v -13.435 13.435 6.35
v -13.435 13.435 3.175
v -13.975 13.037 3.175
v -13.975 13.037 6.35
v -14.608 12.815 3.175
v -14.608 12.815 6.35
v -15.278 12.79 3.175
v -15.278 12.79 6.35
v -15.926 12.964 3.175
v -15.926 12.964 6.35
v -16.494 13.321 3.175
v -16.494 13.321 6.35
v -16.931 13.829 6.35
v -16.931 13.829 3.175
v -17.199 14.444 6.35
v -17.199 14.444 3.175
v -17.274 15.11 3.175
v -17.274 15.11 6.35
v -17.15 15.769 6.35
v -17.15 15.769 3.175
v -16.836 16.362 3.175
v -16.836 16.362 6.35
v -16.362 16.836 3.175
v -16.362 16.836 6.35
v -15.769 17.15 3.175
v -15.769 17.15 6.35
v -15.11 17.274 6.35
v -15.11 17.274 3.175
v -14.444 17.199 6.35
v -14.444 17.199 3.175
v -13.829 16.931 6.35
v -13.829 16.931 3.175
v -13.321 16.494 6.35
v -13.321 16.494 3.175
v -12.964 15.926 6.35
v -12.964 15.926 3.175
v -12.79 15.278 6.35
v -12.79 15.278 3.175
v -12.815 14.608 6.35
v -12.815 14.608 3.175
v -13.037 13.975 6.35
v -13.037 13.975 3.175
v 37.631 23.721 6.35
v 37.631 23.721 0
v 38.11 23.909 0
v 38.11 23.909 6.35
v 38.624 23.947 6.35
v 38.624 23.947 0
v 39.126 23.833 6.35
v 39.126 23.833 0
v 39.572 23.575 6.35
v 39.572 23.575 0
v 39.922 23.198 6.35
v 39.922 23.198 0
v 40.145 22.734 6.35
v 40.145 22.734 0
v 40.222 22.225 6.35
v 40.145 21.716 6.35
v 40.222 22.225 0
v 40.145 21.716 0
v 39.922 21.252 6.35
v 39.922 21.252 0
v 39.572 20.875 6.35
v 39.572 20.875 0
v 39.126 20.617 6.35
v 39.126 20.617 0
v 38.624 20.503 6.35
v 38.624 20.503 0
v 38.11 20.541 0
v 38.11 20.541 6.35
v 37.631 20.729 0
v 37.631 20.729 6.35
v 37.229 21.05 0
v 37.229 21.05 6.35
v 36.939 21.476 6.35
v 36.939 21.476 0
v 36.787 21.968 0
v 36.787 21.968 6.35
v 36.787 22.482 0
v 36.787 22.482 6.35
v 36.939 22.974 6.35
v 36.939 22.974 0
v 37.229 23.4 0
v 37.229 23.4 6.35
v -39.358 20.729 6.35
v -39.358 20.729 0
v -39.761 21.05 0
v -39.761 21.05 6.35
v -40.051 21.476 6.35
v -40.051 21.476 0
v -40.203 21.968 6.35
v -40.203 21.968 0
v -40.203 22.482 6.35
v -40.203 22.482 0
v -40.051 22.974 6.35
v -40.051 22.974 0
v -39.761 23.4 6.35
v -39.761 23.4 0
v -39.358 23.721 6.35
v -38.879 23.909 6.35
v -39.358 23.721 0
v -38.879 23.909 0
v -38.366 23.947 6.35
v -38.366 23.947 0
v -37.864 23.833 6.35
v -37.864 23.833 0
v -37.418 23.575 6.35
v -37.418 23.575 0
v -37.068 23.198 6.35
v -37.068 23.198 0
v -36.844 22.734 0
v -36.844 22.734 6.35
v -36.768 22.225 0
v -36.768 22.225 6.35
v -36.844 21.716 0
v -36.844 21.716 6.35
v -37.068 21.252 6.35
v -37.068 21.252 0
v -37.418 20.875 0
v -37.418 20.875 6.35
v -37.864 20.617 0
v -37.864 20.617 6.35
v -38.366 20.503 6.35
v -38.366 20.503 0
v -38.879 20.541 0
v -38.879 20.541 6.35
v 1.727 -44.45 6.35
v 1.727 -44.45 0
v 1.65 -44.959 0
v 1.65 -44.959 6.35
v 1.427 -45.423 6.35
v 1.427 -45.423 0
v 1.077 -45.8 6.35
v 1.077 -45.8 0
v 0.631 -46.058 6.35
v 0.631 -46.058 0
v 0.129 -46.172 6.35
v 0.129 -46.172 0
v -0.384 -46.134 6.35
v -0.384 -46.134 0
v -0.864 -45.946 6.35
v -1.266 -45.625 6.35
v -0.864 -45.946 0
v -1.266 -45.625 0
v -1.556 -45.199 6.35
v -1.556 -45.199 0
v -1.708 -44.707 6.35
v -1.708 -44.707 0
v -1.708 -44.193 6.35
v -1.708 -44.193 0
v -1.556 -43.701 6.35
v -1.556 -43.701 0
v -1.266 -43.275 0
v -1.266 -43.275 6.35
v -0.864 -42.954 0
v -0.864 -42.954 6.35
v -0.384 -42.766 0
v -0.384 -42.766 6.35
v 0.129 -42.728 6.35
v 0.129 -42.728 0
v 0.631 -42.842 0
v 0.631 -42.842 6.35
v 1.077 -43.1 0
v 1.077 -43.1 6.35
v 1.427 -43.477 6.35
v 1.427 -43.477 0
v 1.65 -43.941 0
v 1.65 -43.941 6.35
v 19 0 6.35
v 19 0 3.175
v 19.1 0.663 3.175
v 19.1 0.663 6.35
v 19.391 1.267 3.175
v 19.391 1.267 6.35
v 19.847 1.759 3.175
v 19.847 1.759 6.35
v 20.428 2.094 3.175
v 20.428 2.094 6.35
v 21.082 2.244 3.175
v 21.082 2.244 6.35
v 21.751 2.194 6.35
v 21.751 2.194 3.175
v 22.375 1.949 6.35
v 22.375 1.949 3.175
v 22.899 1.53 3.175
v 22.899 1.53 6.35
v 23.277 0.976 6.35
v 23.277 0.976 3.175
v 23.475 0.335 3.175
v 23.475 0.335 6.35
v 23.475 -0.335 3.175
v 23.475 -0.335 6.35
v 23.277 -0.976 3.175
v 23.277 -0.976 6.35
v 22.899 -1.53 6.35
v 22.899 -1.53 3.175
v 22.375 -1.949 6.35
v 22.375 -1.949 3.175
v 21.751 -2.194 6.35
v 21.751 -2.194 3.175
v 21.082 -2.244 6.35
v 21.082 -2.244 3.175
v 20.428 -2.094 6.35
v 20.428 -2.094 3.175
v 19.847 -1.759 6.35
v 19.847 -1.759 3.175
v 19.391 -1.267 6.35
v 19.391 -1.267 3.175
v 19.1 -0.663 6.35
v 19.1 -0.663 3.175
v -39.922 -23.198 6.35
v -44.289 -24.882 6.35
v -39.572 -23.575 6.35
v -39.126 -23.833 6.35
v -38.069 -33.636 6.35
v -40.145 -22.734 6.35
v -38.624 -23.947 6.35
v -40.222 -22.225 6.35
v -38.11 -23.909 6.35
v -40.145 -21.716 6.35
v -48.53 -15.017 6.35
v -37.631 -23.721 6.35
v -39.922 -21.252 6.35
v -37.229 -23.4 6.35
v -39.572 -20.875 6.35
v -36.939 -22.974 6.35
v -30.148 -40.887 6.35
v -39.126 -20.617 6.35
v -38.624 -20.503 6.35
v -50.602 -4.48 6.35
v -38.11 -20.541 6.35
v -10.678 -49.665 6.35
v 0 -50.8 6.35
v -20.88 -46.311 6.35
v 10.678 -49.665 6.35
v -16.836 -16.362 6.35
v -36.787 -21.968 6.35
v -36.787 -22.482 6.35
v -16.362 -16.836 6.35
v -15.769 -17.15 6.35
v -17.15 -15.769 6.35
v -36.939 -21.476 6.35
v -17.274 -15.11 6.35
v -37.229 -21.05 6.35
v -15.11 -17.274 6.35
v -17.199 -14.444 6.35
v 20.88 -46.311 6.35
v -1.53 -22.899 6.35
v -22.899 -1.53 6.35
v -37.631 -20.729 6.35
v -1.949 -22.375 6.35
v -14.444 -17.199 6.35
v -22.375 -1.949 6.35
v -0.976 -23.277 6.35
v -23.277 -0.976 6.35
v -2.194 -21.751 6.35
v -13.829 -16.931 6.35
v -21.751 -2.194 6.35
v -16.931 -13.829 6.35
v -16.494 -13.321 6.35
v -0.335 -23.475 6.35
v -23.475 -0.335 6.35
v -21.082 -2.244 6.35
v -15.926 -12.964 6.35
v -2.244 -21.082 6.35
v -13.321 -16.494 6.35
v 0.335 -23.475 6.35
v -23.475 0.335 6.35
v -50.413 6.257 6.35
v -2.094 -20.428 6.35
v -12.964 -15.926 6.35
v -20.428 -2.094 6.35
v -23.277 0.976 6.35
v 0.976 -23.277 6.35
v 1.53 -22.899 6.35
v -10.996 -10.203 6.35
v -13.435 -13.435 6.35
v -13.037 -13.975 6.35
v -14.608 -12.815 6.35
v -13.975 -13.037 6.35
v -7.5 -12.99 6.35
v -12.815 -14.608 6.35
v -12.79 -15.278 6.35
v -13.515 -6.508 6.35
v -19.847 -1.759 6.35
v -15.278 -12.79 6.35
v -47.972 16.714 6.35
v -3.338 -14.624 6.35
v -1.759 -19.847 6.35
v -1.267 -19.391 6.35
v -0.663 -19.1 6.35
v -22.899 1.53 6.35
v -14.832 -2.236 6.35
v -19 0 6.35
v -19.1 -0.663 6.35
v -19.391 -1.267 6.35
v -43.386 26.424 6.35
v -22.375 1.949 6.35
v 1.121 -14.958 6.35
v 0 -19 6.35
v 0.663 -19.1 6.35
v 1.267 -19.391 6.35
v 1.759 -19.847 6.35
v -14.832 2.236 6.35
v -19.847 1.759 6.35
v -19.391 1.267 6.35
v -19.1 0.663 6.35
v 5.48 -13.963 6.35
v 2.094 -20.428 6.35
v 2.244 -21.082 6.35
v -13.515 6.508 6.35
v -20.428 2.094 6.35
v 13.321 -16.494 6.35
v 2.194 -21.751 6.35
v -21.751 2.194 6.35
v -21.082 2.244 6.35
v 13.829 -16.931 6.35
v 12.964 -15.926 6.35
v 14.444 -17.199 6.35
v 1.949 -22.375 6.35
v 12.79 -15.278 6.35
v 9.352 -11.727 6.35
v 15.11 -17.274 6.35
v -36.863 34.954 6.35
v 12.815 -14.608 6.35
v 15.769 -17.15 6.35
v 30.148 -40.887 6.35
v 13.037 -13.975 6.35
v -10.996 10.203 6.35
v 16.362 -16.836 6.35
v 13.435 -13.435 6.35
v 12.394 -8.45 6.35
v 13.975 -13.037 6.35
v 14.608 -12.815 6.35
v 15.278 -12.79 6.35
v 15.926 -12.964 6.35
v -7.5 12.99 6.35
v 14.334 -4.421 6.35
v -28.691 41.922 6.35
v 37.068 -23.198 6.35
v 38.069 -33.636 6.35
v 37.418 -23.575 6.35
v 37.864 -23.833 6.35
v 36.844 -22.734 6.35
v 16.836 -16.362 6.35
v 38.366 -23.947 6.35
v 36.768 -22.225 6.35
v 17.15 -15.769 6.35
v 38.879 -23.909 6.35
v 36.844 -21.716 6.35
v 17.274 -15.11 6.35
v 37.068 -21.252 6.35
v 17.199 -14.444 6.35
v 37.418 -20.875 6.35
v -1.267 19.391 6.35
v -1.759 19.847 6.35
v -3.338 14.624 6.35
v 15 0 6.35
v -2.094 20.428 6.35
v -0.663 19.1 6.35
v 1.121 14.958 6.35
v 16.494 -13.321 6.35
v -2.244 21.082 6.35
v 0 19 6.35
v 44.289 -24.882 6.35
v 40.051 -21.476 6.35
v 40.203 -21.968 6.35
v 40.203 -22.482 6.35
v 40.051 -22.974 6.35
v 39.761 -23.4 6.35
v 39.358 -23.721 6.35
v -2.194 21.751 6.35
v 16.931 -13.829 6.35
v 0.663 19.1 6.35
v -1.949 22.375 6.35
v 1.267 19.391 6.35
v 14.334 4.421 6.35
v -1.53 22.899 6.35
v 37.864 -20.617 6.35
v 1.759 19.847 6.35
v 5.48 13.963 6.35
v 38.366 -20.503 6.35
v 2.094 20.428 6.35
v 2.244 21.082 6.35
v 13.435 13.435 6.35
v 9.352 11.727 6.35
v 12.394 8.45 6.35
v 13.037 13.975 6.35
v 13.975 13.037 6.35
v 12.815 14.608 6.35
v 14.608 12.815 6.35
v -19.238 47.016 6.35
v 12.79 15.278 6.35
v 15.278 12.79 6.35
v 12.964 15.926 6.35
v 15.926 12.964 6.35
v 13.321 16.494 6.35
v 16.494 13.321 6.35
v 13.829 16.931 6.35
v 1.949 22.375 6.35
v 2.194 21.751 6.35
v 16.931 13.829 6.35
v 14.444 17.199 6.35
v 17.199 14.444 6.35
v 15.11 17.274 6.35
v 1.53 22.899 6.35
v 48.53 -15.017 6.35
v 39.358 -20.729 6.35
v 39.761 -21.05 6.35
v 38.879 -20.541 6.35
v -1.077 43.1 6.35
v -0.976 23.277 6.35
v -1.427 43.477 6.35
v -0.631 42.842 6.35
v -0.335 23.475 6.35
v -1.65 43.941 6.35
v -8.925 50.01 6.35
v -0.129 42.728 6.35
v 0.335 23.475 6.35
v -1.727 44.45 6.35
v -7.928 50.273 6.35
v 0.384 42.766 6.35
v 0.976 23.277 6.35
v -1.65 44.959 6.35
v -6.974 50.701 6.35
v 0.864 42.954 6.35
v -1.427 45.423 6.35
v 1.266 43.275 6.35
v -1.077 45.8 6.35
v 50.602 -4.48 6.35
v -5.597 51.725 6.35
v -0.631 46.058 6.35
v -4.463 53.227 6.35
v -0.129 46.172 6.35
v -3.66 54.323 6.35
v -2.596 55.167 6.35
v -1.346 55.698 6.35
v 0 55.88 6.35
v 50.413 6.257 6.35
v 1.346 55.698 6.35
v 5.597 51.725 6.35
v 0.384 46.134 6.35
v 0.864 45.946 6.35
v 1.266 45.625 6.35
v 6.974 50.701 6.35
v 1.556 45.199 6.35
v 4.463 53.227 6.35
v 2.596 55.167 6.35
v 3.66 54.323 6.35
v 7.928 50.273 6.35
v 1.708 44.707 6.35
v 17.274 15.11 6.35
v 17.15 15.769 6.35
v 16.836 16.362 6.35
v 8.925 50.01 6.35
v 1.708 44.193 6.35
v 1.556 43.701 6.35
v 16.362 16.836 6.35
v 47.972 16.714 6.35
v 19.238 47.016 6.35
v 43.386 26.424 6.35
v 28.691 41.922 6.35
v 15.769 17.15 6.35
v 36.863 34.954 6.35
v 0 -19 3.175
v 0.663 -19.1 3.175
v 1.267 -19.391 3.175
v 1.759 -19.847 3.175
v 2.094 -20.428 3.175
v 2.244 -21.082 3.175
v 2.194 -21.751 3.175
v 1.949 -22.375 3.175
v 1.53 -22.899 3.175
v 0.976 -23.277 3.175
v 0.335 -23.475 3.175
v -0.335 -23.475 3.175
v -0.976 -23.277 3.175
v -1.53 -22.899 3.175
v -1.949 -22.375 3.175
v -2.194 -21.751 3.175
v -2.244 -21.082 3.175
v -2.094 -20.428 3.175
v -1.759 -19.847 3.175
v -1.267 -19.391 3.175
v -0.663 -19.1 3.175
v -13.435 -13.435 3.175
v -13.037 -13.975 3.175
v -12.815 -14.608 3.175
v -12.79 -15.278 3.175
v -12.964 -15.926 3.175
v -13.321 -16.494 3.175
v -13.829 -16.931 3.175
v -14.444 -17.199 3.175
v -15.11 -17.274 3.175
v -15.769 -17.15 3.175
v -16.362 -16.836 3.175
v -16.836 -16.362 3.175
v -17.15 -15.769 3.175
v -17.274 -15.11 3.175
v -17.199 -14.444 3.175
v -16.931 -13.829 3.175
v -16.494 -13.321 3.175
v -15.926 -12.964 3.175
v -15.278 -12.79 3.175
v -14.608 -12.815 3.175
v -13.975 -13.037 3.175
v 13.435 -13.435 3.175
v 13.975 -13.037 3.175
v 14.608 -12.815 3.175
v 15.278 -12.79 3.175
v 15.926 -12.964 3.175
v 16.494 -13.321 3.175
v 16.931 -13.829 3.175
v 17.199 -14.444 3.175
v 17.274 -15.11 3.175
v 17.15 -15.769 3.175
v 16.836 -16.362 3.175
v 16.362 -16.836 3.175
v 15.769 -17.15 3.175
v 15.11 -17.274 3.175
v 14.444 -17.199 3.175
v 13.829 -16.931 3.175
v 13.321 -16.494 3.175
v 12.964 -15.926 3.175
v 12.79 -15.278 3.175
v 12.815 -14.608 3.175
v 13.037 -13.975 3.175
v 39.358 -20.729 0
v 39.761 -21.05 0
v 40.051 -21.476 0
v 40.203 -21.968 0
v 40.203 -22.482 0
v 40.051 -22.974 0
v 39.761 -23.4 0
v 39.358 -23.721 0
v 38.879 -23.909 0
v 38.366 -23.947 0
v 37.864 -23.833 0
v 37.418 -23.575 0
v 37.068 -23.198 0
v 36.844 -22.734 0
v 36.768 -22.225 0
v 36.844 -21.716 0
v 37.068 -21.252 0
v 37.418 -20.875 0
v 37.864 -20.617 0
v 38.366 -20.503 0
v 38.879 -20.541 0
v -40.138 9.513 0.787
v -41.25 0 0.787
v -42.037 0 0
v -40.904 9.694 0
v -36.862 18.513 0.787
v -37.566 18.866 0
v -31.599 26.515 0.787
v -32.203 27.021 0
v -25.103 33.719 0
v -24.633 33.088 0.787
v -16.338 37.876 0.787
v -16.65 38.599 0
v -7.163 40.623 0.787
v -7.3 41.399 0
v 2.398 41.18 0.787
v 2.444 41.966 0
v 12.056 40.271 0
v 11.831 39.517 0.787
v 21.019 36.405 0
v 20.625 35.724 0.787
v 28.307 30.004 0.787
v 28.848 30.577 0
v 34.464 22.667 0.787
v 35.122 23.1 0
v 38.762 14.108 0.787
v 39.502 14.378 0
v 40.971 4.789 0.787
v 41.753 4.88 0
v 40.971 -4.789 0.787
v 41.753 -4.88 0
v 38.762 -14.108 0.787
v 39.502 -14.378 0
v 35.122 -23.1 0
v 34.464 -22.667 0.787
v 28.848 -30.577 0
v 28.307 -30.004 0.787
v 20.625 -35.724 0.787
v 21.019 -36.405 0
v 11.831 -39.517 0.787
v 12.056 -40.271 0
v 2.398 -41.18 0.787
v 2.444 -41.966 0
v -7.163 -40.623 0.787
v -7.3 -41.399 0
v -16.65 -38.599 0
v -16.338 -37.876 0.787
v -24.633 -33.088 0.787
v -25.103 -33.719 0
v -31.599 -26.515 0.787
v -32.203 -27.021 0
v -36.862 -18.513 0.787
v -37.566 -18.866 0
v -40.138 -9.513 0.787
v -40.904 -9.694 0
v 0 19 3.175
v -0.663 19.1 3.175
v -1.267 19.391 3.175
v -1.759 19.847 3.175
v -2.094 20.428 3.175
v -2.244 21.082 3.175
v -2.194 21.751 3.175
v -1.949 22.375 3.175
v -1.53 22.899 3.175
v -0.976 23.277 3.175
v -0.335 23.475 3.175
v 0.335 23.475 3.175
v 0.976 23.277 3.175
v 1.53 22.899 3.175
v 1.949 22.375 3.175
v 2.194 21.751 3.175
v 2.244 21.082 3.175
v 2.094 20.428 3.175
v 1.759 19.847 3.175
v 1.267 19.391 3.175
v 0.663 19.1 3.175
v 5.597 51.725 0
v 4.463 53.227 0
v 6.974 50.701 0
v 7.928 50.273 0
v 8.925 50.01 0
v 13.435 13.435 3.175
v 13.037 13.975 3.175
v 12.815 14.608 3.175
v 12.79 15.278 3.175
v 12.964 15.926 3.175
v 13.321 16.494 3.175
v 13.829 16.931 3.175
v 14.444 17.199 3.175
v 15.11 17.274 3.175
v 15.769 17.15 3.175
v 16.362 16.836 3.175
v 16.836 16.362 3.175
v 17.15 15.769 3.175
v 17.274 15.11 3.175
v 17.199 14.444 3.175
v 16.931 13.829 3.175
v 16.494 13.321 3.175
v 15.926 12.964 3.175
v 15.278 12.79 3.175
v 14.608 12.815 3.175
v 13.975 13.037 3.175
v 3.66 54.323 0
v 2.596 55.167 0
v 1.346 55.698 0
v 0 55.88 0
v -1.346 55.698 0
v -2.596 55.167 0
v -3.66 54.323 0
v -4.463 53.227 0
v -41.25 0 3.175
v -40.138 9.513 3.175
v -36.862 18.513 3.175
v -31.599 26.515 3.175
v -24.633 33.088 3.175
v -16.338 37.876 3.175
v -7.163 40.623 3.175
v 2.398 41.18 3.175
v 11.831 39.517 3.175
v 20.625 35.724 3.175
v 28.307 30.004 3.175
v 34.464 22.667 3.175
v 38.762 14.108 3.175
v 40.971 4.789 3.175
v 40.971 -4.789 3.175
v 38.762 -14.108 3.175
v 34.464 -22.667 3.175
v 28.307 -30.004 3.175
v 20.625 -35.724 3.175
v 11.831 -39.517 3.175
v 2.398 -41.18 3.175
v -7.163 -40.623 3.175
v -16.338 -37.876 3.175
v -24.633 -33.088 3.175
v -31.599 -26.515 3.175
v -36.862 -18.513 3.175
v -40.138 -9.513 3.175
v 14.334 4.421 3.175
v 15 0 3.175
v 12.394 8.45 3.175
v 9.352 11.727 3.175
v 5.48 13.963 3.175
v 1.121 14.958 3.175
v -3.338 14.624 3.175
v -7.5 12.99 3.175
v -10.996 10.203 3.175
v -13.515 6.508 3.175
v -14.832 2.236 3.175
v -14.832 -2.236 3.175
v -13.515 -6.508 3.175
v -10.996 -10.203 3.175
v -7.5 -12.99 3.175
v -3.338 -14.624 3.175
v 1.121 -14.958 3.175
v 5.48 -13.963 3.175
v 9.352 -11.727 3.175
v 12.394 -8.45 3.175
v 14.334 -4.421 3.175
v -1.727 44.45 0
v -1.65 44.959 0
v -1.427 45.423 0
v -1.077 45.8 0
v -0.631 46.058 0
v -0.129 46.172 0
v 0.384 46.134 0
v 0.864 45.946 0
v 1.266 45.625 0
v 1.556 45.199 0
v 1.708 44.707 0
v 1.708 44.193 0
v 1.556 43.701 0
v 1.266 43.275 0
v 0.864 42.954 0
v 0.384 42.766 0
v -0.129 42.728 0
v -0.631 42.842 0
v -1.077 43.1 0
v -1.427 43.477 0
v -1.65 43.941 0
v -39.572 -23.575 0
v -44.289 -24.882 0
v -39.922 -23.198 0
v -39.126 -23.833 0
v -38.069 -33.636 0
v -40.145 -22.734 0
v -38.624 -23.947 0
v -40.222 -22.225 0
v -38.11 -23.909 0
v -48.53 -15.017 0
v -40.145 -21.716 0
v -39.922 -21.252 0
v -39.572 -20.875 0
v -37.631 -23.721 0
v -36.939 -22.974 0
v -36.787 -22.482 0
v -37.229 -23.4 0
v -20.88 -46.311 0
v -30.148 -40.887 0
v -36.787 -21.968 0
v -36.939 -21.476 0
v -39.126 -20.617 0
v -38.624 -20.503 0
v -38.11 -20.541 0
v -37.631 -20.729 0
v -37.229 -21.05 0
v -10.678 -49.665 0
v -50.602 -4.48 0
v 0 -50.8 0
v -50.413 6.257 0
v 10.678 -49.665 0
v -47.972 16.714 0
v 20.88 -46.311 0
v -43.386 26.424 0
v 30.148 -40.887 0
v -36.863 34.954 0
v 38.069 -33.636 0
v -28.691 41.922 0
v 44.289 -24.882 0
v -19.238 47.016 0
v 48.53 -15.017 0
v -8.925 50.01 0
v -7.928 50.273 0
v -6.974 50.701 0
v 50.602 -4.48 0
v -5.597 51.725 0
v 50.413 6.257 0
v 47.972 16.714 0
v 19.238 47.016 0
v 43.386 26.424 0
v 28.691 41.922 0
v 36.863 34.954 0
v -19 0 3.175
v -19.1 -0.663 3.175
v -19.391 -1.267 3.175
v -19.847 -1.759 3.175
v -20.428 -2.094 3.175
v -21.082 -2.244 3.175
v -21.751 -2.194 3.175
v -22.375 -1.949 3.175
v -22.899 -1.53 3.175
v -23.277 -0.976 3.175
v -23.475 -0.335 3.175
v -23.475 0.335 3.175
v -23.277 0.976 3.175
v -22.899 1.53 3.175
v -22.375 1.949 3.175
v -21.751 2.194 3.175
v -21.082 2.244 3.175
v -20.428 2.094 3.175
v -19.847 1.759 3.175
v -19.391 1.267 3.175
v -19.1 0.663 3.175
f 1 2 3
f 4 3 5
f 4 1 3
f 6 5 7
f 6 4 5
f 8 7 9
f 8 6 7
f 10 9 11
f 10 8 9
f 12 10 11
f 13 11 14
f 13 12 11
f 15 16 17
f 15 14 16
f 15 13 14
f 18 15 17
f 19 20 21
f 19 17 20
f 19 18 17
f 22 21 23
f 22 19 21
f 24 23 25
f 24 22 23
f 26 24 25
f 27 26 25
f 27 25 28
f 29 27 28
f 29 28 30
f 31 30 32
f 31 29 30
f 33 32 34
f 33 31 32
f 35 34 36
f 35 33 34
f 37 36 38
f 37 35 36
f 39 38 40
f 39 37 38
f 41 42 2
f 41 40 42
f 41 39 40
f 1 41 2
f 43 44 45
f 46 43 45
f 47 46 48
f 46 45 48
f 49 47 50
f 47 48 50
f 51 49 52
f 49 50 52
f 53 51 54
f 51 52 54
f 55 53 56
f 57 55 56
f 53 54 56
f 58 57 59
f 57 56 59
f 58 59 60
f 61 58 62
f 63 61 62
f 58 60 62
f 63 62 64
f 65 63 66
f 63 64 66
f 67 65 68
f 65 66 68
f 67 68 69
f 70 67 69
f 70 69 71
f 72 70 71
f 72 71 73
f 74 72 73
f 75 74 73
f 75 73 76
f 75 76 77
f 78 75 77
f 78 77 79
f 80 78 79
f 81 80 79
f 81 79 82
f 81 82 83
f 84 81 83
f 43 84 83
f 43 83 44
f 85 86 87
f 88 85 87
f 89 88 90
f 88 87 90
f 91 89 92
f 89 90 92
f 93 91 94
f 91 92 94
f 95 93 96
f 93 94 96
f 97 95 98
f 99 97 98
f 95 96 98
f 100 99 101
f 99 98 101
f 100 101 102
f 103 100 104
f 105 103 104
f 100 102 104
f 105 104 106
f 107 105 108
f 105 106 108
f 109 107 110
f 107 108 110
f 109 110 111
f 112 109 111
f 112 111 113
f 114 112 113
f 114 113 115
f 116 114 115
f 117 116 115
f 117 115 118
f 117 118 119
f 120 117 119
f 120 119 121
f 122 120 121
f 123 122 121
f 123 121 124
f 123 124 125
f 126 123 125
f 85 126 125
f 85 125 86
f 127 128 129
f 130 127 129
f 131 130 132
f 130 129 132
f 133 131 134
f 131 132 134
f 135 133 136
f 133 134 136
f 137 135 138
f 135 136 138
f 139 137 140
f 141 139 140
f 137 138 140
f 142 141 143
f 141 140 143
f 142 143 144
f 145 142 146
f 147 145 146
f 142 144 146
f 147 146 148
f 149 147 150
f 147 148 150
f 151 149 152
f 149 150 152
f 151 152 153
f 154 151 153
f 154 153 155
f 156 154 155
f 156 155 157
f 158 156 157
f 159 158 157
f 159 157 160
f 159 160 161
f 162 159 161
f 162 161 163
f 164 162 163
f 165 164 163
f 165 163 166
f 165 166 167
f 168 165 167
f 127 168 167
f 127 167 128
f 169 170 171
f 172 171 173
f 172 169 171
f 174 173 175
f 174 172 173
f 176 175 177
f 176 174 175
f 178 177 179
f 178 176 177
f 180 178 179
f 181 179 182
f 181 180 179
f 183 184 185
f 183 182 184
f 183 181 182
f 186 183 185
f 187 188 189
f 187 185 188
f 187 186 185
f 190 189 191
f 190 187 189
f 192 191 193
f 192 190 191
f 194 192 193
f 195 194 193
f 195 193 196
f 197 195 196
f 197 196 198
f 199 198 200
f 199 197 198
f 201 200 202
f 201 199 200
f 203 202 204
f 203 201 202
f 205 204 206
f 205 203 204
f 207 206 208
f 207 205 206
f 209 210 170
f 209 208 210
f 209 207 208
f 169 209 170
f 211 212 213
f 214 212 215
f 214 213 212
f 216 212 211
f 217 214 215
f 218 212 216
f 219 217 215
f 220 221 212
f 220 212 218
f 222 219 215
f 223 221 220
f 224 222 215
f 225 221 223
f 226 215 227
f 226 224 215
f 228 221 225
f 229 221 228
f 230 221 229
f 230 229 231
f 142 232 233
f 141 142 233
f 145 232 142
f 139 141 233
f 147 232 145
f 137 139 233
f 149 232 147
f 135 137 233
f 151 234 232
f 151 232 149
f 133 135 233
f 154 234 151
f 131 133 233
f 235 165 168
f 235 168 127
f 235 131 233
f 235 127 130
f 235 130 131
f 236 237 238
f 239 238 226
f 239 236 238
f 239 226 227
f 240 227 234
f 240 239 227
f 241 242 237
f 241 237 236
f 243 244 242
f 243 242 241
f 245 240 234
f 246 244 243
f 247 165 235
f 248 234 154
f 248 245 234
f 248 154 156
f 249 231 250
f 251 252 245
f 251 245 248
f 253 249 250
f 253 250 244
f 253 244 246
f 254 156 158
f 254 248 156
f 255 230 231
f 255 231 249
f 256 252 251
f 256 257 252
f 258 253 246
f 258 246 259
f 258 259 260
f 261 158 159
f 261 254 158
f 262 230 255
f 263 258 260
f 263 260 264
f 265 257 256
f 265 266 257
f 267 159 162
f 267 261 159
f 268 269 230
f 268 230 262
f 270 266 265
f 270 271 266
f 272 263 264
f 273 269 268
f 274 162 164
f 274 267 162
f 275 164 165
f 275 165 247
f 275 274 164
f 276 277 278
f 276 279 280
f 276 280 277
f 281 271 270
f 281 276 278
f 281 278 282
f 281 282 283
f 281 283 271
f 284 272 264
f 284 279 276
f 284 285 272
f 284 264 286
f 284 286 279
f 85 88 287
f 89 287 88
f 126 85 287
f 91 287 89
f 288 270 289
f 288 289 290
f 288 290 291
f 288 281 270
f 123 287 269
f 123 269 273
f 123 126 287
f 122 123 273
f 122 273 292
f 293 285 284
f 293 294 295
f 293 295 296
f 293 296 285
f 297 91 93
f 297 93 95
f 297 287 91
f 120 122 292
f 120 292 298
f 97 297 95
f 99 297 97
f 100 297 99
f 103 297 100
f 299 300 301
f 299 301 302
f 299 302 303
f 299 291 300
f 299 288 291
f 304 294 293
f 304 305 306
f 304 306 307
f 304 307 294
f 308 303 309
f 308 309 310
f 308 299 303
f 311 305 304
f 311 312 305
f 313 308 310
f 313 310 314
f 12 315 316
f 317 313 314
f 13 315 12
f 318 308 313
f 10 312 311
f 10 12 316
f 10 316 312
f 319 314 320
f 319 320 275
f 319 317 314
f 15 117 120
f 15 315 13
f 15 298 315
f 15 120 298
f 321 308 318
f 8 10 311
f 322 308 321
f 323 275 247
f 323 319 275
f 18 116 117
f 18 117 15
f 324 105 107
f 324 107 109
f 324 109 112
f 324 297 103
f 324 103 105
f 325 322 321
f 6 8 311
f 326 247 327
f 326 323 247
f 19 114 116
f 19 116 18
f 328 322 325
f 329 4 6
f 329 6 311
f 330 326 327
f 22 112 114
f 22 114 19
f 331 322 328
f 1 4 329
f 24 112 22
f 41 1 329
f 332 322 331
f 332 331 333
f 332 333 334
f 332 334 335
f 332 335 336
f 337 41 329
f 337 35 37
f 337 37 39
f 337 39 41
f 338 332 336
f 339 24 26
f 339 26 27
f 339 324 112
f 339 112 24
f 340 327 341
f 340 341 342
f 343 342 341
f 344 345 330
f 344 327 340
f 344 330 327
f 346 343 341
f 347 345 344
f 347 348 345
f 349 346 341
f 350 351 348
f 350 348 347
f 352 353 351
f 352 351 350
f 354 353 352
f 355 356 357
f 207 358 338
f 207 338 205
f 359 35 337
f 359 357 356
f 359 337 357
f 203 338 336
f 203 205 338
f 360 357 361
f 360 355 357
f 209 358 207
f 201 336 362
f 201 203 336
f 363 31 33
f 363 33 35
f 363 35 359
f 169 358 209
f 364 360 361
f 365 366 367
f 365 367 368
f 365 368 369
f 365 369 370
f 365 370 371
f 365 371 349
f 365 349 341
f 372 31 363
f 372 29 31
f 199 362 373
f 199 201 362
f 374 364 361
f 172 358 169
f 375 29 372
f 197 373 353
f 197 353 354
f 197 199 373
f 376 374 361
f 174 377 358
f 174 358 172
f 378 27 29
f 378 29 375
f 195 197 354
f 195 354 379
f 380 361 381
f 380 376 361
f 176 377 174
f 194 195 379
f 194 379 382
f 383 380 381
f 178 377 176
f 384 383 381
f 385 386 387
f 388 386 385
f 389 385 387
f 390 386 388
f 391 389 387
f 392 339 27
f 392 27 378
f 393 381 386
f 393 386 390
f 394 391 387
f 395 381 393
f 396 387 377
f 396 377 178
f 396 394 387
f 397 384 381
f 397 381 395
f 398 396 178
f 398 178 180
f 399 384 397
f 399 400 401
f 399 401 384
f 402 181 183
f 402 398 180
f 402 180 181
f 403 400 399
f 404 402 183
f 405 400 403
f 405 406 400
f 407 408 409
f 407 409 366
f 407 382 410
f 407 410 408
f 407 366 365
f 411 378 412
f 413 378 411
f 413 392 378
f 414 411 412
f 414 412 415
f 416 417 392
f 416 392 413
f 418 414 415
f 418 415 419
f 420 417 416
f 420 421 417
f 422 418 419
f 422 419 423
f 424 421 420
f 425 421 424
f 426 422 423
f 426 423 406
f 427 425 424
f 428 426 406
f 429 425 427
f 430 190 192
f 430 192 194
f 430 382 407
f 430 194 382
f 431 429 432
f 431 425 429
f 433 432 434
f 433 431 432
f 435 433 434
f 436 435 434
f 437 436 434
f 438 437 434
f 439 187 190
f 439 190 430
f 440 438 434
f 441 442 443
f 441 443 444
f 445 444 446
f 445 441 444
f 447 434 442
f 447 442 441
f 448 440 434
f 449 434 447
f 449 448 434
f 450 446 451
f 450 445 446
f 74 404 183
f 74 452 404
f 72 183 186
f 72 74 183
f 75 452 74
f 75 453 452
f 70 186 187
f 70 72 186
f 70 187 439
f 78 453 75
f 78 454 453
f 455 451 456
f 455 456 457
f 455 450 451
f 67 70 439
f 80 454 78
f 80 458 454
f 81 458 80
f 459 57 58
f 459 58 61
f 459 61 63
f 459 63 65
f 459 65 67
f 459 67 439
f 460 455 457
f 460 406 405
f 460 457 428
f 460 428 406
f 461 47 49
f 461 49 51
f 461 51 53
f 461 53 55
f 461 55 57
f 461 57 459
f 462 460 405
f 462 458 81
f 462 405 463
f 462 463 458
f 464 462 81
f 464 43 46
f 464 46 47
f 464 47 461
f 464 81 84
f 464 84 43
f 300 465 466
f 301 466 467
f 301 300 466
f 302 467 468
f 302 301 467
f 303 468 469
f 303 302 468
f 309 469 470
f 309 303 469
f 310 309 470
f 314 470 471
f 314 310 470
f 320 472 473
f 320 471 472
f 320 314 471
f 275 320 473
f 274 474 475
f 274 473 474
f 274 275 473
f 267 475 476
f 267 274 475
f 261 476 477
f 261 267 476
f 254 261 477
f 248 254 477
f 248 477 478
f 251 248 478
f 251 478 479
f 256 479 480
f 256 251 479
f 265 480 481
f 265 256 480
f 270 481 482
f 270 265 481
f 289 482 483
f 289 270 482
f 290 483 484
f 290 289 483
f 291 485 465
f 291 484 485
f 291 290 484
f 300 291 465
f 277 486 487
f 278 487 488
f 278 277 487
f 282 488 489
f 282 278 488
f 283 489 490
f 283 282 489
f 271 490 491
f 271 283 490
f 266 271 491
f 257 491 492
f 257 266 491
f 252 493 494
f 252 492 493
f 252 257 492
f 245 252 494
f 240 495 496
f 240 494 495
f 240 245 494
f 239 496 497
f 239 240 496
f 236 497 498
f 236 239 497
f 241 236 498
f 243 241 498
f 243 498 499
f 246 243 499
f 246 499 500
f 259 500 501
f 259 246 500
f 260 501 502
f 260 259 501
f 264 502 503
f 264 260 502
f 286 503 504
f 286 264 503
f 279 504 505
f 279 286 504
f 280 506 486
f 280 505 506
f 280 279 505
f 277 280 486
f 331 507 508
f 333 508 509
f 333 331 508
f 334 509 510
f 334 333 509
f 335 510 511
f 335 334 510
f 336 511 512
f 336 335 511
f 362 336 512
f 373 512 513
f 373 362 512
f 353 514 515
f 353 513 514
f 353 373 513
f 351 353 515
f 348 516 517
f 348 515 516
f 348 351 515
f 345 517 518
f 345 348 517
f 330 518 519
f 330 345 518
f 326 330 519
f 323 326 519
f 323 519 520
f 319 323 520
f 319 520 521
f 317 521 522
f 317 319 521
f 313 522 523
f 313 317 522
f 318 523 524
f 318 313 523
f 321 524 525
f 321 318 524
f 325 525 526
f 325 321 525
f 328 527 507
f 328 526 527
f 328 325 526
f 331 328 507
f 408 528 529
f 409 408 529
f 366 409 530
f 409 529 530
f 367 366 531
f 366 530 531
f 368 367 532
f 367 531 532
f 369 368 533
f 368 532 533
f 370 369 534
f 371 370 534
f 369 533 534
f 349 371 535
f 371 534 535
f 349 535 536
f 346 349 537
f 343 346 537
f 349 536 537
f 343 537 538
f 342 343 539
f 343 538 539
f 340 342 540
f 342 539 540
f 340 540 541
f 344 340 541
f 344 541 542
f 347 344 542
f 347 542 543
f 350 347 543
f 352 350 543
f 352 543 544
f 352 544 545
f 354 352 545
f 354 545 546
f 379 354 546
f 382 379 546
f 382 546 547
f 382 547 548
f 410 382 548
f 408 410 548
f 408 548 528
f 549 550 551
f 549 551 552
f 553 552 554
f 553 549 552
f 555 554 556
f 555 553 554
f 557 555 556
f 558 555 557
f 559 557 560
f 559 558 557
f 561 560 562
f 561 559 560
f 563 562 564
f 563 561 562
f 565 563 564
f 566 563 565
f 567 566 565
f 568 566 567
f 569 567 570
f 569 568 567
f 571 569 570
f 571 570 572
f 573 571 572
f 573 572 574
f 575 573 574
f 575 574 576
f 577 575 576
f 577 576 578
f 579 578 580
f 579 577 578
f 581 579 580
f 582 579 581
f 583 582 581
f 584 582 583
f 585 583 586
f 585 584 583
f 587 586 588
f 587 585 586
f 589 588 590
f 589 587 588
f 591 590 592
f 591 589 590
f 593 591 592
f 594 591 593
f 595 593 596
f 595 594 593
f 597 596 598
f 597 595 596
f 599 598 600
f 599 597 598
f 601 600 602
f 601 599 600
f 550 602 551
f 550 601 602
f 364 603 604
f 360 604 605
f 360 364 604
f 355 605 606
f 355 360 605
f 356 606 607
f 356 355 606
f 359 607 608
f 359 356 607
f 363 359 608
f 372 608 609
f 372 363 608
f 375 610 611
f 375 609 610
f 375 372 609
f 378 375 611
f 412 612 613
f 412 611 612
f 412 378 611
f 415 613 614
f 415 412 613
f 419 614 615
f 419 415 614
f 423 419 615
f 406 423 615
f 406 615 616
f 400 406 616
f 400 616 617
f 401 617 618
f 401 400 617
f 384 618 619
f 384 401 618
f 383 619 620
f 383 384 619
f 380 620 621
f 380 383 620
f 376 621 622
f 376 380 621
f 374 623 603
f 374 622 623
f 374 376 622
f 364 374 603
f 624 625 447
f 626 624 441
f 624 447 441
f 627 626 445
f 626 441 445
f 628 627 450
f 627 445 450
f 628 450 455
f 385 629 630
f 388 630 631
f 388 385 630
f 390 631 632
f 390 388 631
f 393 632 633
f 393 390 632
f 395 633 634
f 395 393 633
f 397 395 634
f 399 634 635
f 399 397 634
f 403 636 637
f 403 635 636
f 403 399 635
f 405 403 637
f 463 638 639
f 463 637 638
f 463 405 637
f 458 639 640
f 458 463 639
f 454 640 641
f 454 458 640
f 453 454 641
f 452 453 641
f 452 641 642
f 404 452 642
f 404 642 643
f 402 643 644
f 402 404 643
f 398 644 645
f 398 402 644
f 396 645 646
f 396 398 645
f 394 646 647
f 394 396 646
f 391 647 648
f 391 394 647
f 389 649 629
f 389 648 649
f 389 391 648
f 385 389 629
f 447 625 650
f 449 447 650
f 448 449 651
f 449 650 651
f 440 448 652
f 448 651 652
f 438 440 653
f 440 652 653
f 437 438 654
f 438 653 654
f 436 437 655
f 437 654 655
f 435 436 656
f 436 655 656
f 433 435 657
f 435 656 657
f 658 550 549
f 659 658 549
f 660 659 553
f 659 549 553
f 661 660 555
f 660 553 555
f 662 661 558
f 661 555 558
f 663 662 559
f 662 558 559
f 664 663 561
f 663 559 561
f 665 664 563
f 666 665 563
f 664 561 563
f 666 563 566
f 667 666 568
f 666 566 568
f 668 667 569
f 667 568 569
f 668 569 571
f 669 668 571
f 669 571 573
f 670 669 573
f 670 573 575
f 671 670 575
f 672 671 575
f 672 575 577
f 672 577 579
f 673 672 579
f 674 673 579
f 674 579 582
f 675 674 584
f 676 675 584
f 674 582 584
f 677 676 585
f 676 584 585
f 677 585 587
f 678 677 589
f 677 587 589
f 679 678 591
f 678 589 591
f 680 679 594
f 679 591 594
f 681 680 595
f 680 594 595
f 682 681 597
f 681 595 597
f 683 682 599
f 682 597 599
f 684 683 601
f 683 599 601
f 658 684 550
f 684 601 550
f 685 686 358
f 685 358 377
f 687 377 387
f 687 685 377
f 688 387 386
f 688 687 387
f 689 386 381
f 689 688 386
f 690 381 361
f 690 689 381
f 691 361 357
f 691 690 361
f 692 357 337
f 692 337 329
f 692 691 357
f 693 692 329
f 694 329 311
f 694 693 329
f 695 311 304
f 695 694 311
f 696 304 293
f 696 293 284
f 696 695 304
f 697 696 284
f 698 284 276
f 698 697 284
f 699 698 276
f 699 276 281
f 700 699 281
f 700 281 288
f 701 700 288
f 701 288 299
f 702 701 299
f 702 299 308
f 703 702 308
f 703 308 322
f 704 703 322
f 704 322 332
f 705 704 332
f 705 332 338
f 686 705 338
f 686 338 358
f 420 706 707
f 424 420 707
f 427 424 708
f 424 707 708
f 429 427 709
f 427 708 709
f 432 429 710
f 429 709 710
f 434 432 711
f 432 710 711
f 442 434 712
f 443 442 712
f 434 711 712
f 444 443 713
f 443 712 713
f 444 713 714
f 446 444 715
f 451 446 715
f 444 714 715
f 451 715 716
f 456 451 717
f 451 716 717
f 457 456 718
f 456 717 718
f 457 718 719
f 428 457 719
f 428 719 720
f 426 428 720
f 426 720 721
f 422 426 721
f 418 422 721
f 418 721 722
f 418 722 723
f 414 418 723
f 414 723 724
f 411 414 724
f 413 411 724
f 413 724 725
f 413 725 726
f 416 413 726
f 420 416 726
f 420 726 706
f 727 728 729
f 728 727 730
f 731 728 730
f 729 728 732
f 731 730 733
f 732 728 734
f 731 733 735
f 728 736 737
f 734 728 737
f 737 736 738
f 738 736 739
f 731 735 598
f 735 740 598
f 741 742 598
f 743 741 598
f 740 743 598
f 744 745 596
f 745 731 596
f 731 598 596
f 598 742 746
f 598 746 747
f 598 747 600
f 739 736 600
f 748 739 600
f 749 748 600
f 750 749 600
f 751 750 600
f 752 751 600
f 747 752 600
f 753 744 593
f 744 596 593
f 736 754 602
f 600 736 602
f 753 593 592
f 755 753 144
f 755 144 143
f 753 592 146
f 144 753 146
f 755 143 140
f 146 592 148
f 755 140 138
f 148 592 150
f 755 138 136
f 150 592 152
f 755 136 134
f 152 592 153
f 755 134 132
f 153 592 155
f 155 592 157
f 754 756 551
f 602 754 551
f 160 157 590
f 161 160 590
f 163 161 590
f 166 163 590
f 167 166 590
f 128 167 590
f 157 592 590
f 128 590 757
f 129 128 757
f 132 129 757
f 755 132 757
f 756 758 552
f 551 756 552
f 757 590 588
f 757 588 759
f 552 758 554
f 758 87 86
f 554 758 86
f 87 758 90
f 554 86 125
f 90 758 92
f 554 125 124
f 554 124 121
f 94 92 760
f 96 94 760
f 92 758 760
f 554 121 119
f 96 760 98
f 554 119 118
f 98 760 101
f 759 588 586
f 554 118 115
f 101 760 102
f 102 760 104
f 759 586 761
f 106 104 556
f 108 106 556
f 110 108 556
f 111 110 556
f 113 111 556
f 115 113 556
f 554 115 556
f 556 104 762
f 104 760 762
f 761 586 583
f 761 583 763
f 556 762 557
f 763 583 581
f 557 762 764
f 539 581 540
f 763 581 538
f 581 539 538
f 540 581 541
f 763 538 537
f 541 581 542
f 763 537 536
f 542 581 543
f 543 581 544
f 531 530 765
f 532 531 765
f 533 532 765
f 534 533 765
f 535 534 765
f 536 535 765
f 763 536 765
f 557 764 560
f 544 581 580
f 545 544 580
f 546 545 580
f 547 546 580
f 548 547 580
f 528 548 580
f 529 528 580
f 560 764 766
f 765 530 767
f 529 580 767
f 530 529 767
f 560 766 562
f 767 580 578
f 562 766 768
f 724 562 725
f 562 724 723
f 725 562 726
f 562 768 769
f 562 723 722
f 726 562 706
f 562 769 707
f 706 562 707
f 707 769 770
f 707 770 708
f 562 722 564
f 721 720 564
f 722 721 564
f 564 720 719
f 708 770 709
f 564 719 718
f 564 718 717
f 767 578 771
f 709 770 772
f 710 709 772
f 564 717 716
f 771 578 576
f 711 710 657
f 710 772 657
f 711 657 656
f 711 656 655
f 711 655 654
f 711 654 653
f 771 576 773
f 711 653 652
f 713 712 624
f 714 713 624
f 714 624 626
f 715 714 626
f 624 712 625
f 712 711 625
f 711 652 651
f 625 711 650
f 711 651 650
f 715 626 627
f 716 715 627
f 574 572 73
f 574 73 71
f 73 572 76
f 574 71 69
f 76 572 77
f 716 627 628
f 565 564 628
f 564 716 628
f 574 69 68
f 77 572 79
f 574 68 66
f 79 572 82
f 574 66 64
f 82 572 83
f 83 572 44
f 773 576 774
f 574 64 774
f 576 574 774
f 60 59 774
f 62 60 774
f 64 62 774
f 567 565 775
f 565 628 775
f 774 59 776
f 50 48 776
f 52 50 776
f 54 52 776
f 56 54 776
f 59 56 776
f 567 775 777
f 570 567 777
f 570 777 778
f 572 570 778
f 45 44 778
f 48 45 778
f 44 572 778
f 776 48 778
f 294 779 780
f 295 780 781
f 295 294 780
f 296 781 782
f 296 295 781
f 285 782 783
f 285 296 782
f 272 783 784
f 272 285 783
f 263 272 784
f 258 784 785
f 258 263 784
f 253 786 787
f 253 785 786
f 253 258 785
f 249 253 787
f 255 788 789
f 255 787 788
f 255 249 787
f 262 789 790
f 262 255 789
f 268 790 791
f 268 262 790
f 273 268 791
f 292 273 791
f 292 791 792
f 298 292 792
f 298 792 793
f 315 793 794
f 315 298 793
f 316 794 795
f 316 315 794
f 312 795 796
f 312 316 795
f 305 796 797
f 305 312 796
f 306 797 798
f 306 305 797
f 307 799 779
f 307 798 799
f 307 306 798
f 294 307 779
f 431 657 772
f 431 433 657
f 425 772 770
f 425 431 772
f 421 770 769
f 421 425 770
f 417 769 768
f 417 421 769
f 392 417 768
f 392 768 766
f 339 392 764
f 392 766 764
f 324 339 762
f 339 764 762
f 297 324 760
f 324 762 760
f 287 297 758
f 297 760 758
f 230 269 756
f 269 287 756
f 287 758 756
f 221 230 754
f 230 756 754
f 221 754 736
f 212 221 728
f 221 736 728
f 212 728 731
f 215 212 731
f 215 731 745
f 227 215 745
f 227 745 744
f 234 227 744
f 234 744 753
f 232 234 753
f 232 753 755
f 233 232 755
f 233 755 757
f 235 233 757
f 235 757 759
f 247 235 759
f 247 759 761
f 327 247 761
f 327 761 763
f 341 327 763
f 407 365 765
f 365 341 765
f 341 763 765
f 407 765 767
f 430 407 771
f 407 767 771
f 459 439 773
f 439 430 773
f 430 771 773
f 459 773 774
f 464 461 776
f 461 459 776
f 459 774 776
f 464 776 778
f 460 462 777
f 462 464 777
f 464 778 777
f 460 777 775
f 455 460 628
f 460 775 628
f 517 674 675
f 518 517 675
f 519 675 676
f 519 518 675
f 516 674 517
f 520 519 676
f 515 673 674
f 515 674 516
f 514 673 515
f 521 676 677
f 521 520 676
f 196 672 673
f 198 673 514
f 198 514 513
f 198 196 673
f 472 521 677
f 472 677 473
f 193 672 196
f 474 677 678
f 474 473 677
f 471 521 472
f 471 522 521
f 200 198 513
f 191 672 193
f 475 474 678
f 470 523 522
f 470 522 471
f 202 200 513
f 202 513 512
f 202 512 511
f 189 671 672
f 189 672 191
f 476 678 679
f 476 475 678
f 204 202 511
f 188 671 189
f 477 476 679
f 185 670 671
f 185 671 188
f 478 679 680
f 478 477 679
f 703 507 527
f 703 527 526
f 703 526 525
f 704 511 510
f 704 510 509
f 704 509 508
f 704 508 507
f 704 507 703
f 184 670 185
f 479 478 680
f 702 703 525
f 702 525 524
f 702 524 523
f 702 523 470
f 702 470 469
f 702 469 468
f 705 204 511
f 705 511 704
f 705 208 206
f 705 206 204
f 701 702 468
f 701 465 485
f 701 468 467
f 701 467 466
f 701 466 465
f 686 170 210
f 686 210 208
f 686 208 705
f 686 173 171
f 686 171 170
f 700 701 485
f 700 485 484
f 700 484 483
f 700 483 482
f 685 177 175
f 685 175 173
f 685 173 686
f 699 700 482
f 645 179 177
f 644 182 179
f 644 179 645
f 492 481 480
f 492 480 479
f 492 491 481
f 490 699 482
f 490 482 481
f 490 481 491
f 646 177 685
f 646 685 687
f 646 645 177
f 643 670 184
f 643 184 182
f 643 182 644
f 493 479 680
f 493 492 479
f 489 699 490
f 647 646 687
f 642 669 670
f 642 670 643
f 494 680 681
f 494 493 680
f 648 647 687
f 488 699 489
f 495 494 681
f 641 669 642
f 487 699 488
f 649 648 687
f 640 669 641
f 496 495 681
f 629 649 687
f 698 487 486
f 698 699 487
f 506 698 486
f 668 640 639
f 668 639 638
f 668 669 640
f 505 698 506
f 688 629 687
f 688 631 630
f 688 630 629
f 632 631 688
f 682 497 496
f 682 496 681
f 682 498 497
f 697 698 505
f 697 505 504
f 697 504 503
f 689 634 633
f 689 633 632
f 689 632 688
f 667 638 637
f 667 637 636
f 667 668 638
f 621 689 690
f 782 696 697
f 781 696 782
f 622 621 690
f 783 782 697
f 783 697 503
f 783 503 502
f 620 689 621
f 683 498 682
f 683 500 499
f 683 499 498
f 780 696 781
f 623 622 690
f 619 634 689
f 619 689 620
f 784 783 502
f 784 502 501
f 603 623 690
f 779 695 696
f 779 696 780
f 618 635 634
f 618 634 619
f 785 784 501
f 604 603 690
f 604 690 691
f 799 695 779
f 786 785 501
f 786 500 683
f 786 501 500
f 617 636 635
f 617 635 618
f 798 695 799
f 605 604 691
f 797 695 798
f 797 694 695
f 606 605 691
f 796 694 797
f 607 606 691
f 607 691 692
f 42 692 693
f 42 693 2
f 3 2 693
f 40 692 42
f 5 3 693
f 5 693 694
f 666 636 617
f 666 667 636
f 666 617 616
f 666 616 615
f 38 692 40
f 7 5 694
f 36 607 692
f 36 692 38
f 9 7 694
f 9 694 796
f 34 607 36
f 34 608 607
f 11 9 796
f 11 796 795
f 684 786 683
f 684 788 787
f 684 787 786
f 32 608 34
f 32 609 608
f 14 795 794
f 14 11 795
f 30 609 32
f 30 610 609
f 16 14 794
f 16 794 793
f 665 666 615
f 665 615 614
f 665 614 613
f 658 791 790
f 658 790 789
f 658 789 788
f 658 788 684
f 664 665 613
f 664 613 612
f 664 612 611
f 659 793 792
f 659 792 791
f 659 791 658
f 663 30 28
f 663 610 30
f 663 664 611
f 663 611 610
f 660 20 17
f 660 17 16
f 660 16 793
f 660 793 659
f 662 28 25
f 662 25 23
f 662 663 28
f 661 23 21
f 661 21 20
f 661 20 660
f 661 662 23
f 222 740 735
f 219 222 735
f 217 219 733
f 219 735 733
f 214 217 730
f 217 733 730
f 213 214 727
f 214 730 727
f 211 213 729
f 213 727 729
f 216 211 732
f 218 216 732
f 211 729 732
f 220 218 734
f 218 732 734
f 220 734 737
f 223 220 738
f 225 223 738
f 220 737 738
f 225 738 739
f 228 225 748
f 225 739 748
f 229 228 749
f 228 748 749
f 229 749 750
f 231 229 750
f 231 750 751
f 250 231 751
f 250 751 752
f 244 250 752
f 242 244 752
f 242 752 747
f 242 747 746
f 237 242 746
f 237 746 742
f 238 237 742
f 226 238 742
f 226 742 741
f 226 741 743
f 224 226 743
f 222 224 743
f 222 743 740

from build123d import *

# Parameters (mm, degrees)
SKETCH1_R             = 50.8
SKETCH1_R_2           = 15
BOSS_EXTRUDE1_DEPTH   = 6.35
CIRPATTERN1_COUNT     = 8
SKETCH5_R             = 41.25
CUT_EXTRUDE1_DEPTH    = 3.175
CHAMFER1_SIZE         = 0.7874
F_8_32_TAPPED_HOLE1_D = 3.4544
CIRPATTERN2_COUNT     = 6
BOSS_EXTRUDE3_START   = -6.35
BOSS_EXTRUDE3_DEPTH   = 6.35
FILLET2_R             = 6.35


with BuildPart() as part:
    # Sketch1 → Boss-Extrude1 (new body)
    with BuildSketch(Plane.XY):
        Circle(SKETCH1_R)
        Circle(SKETCH1_R_2, mode=Mode.SUBTRACT)
    extrude(amount=BOSS_EXTRUDE1_DEPTH)

    # Sketch4 → M4 Clearance Hole1 (revolve, cut)
    with BuildSketch(Plane(origin=(0, 21.249999918, 6.35), x_dir=(0, -1, 0), z_dir=(1, 0, 0))):
        Polygon((0, 0), (0, 26.751936393), (2.25, 25.4), (2.25, 0), align=None)
    m4_clearance_hole1 = revolve(axis=Axis((0, 21.249999918, 12.7), (0, 0, -1)), mode=Mode.SUBTRACT)

    # CirPattern1: M4 Clearance Hole1 ×8 about axis
    cirpattern1_axis = Axis((0, 0, 0), (0, 0, 1))
    for i in range(1, CIRPATTERN1_COUNT):
        add(m4_clearance_hole1.rotate(cirpattern1_axis, i * 360 / CIRPATTERN1_COUNT), mode=Mode.SUBTRACT)

    # Sketch5 → Cut-Extrude1 (cut)
    with BuildSketch(Plane(origin=(0, 0, 0), x_dir=(-1, 0, 0), z_dir=(0, 0, -1))):
        Circle(SKETCH5_R)
    extrude(amount=-CUT_EXTRUDE1_DEPTH, mode=Mode.SUBTRACT)

    # Chamfer1
    chamfer1_edges = [part.edges().sort_by_distance(p)[0] for p in [
        (41.25, 0, 0),
    ]]
    chamfer(chamfer1_edges, length=CHAMFER1_SIZE)

    # #8-32 Tapped Hole1 (through all)
    with Locations(Plane.XY.offset(6.35)):
        with Locations((0, 44.45)):
            f_8_32_tapped_hole1 = Hole(F_8_32_TAPPED_HOLE1_D / 2)

    # CirPattern2: #8-32 Tapped Hole1 ×6 about axis
    cirpattern2_axis = Axis((0, 0, 0), (0, 0, 1))
    for i in range(1, CIRPATTERN2_COUNT):
        add(f_8_32_tapped_hole1.rotate(cirpattern2_axis, i * 360 / CIRPATTERN2_COUNT), mode=Mode.SUBTRACT)

    # Sketch10 → Boss-Extrude3 (add)
    with BuildSketch(Plane.XY.offset(6.35).offset(BOSS_EXTRUDE3_START)):
        with BuildLine():
            ThreePointArc((5.073646026, 50.546), (0, 55.88), (-5.073646026, 50.546))
            ThreePointArc((-5.073646026, 50.546), (0, 50.8), (5.073646026, 50.546))
        make_face()
    extrude(amount=BOSS_EXTRUDE3_DEPTH)

    # Fillet2
    fillet2_edges = [part.edges().sort_by_distance(p)[0] for p in [
        (5.073646026, 50.546, 3.175),
        (-5.073646026, 50.546, 3.175),
    ]]
    fillet(fillet2_edges, radius=FILLET2_R)


solid = part.part
